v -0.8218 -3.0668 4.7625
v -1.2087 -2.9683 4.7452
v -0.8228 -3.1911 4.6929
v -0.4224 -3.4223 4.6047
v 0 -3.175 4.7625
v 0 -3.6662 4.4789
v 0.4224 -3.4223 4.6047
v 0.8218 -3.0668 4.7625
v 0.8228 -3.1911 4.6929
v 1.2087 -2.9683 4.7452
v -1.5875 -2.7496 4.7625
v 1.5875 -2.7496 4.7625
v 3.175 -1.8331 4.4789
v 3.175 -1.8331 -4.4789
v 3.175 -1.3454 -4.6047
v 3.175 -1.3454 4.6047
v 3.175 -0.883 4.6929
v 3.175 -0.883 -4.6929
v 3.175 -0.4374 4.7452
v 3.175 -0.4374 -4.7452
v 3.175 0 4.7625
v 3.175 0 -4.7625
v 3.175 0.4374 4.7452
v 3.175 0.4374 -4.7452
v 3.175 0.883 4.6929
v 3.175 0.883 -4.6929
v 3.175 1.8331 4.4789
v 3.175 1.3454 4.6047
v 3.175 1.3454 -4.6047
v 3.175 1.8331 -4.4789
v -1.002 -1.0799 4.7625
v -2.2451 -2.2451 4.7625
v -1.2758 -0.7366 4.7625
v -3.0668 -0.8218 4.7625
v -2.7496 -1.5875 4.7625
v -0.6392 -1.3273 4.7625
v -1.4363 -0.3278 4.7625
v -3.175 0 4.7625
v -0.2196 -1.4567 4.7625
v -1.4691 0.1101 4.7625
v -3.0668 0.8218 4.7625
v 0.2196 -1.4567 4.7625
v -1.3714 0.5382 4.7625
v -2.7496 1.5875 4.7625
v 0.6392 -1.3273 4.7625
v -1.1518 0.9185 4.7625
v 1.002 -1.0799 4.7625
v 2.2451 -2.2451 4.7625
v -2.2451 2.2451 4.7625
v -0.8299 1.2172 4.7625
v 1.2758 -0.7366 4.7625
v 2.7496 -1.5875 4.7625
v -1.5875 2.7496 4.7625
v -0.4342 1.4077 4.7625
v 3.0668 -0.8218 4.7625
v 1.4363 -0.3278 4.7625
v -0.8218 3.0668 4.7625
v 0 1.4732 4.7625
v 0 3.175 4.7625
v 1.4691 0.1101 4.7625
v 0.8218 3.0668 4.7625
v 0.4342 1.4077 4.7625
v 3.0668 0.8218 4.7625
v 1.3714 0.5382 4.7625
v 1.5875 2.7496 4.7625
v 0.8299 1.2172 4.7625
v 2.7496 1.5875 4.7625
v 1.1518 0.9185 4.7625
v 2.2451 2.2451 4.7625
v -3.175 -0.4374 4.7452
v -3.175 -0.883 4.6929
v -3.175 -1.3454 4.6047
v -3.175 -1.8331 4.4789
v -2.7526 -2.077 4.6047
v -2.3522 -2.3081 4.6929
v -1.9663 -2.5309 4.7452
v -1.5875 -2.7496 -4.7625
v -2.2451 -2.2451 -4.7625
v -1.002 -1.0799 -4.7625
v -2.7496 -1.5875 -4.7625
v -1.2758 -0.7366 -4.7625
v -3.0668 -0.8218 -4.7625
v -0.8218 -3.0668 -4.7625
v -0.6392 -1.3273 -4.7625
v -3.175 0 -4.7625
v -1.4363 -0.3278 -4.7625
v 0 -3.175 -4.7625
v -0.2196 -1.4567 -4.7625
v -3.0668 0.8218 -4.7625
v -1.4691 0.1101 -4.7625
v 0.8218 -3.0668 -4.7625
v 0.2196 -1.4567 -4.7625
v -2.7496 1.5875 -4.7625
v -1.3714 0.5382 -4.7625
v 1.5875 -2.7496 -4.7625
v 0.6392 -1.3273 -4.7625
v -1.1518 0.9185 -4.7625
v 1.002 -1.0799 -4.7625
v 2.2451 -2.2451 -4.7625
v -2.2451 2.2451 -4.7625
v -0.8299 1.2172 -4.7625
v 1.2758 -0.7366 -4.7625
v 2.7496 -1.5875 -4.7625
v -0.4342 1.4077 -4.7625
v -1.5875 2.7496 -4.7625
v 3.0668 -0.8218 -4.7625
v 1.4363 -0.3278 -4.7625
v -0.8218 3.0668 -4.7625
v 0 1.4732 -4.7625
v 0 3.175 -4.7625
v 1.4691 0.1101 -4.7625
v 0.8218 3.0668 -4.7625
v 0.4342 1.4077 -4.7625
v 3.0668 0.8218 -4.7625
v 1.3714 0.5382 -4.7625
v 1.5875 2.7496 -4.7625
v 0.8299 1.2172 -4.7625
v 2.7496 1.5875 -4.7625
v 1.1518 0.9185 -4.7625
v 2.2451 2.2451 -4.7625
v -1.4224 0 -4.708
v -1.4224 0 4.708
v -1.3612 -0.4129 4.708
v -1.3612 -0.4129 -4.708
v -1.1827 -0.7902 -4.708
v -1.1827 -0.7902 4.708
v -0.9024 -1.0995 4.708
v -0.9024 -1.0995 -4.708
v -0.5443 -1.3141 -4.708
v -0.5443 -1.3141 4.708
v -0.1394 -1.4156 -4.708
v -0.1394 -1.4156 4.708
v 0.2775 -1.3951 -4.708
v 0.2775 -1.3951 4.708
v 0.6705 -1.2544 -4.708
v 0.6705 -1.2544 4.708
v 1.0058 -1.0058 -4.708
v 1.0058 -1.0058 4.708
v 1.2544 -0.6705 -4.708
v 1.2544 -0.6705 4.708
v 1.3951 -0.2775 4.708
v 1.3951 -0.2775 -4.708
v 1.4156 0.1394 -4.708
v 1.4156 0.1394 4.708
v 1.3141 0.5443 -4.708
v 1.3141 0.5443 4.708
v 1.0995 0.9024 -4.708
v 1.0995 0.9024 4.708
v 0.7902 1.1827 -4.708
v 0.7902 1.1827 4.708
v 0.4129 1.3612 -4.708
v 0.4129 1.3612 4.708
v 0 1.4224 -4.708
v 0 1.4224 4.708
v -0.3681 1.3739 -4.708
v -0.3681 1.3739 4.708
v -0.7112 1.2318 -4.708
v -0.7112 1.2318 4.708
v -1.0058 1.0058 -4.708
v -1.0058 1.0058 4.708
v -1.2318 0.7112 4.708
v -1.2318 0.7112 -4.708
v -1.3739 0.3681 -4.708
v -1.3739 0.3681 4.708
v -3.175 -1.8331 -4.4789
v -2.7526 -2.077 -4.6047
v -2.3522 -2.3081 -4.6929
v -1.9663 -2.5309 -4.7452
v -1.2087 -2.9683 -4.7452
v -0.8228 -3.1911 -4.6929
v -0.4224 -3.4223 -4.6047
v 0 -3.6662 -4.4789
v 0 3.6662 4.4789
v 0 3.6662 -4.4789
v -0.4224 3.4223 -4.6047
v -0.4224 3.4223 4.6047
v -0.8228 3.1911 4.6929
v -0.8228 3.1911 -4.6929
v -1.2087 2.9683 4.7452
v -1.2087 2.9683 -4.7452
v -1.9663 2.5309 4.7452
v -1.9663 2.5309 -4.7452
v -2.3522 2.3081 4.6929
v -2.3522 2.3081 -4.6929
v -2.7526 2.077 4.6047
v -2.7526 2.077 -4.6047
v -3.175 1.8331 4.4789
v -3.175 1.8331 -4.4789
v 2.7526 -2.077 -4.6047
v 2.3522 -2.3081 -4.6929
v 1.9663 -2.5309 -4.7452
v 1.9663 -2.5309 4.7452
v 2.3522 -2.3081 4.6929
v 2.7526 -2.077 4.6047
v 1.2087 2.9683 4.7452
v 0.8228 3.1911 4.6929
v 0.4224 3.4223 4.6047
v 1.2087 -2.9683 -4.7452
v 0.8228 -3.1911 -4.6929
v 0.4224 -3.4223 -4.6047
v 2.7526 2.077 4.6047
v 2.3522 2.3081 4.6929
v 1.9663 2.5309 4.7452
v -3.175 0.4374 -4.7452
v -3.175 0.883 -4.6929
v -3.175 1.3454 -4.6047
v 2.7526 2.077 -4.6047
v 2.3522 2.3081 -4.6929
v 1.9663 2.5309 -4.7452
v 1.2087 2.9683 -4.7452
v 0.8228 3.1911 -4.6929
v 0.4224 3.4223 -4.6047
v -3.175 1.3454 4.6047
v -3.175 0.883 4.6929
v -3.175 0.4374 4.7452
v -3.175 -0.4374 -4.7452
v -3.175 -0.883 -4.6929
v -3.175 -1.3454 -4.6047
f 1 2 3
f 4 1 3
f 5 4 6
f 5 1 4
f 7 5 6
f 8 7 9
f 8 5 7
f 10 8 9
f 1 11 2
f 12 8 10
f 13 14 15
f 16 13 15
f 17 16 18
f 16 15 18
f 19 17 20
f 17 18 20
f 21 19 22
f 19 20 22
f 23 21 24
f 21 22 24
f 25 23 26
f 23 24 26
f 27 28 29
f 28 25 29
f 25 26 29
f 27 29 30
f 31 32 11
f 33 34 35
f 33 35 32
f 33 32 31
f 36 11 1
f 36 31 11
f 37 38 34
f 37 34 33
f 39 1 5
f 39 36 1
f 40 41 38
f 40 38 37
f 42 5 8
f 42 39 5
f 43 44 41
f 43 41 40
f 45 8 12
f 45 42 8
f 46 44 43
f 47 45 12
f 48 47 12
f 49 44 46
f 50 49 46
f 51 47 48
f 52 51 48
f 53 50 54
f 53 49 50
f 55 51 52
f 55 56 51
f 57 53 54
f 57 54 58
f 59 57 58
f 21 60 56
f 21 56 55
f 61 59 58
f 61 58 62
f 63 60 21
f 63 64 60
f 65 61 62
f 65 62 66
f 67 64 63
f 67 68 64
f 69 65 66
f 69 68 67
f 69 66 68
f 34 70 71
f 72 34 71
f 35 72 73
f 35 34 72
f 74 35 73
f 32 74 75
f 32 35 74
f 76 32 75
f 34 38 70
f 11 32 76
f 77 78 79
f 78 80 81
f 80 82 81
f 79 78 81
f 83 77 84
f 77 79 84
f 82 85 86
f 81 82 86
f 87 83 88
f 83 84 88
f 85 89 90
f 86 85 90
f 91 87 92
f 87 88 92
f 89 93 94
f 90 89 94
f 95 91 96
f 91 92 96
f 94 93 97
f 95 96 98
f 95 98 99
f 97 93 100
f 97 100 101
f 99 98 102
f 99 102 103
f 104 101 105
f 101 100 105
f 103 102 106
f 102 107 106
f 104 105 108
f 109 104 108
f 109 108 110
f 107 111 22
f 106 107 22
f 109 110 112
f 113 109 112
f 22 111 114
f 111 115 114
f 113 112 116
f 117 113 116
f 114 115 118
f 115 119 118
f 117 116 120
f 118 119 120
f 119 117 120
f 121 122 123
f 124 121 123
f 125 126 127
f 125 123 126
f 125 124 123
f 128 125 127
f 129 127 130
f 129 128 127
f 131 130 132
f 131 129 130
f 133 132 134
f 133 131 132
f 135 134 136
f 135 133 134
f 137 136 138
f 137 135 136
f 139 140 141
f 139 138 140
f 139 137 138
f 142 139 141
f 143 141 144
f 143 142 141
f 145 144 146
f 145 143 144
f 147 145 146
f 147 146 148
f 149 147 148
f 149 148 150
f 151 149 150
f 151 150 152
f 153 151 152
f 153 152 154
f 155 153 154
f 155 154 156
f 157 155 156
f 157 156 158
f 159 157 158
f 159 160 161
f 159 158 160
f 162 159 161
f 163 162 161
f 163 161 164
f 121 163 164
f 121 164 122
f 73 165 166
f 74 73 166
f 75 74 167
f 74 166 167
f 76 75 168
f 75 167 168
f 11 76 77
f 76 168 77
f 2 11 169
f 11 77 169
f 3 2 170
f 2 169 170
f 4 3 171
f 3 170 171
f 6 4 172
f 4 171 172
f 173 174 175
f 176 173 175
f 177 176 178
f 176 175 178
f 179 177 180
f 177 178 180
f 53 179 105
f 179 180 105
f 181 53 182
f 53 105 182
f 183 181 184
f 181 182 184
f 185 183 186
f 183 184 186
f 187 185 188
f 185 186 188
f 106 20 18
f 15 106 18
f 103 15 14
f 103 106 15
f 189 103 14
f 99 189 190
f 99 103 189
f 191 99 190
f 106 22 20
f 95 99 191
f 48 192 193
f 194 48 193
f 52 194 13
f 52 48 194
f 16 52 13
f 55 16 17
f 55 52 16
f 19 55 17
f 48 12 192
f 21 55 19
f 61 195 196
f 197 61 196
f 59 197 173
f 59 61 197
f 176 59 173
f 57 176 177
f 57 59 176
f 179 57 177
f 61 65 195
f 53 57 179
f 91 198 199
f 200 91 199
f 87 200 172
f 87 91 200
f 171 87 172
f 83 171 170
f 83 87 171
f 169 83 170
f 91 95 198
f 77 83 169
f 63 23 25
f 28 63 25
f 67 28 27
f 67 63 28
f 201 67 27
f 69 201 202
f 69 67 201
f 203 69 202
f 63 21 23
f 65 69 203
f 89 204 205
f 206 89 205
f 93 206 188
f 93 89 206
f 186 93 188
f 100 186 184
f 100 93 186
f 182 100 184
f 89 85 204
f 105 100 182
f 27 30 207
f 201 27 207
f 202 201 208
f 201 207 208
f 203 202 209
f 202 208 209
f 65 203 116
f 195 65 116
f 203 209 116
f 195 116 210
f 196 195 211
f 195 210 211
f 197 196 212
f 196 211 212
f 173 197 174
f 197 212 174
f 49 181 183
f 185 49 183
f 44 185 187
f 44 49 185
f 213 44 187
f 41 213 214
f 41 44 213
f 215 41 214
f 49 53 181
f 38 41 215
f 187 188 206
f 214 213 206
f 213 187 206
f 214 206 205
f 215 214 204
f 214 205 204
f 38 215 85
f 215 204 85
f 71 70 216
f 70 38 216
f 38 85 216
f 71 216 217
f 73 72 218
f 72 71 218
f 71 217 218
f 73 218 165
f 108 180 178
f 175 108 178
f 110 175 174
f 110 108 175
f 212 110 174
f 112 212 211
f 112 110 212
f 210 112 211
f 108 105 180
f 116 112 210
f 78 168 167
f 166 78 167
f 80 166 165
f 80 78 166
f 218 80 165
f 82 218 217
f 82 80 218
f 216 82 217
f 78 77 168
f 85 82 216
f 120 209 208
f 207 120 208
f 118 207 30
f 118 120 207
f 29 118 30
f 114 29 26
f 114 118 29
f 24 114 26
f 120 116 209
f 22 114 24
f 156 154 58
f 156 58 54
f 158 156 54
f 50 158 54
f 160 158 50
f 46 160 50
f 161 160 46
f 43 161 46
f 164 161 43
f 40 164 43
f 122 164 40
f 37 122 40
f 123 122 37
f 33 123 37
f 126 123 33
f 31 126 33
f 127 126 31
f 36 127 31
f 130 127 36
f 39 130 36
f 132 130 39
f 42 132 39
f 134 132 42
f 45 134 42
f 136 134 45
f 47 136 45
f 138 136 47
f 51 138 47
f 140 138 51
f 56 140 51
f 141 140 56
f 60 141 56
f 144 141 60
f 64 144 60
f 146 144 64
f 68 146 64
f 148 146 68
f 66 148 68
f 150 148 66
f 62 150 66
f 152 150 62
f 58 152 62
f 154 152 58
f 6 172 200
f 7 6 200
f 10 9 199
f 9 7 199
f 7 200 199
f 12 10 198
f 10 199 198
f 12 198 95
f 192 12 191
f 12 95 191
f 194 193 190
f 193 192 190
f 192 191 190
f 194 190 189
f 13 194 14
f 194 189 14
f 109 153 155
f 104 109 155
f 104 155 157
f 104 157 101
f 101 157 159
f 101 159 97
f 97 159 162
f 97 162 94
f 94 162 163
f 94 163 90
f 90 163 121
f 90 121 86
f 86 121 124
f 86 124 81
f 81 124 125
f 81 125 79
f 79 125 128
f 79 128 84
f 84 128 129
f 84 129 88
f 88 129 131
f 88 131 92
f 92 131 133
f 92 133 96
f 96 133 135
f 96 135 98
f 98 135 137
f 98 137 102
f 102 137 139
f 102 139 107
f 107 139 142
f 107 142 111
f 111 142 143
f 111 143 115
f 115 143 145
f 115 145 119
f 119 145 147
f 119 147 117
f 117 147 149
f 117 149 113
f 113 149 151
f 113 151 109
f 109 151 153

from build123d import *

# Parameters (mm, degrees)
EXTRUDE1_DEPTH          = 4.7625
EXTRUDE1_DEPTH_BACK     = 4.7625
SKETCH1_R               = 1.4224
SKETCH8_OUTSIDE_W       = 51.56
SKETCH8_OUTSIDE_H       = 52.542
SKETCH8_OUTSIDE_R       = 3.175
EXTRUDE4_DEPTH          = 11.688642726
EXTRUDE4_DRAFT          = -60
MIRROR1_COPY_1_SKETCH_W = 51.56
MIRROR1_COPY_1_SKETCH_H = 52.542
MIRROR1_COPY_1_SKETCH_R = 3.175
MIRROR1_COPY_1_DEPTH    = 11.688642726
MIRROR1_COPY_1_DRAFT    = -60


with BuildPart() as part:
    # Sketch1 → Extrude1 (new, two sides: drawn at the far end of the back side and taken through both)
    with BuildSketch(Plane.XY.offset(-EXTRUDE1_DEPTH_BACK)):
        Polygon((0, 3.666174209), (-3.175, 1.833087105), (-3.175, -1.833087105), (0, -3.666174209), (3.175, -1.833087105), (3.175, 1.833087105), align=None)
        with Locations(Location((0, 0, 0), (0, 0, 180))):
            Circle(SKETCH1_R, mode=Mode.SUBTRACT)
    extrude(amount=EXTRUDE1_DEPTH + EXTRUDE1_DEPTH_BACK)

    # Extrude3 cone 1 section (through the dimple's axis) → Extrude3 (revolve, cut)
    with BuildSketch(Plane(origin=(0, 0, -4.7625), x_dir=(0, 1, 0), z_dir=(1, 0, 0))):
        Polygon((0, 0), (1.4732, 0), (0, 1.579813584), align=None)
    extrude3 = revolve(axis=Axis((0, 0, -4.7625), (0, 0, 1)), mode=Mode.SUBTRACT)


with BuildPart() as extrude4_tool:
    # Sketch8 outside → Extrude4 (with draft: the straight prism first)
    with BuildSketch(Plane(origin=(0, 0, -4.7625), x_dir=(-1, 0, 0), z_dir=(0, 0, -1))):
        Rectangle(SKETCH8_OUTSIDE_W, SKETCH8_OUTSIDE_H)
        Circle(SKETCH8_OUTSIDE_R, mode=Mode.SUBTRACT)
    extrude(amount=-EXTRUDE4_DEPTH)
    # Extrude4: the draft: its side faces are tilted about the plane it starts from
    extrude4_sides = [extrude4_tool.faces().sort_by_distance(p)[0] for p in [
        (0, -26.271, 1.081821363),
        (-25.78, 0, 1.081821363),
        (0, 26.271, 1.081821363),
        (25.78, 0, 1.081821363),
        (3.175, 0, 1.081821363),
    ]]
    draft(extrude4_sides, Plane(origin=(0, 0, -4.7625), x_dir=(-1, 0, 0), z_dir=(0, 0, -1)), EXTRUDE4_DRAFT)


with BuildPart() as part_1:
    add(part.part)

    # Extrude4: cut by extrude4_tool
    add(extrude4_tool.part, mode=Mode.SUBTRACT)

    # Mirror1: Extrude3 across plane
    add(extrude3.mirror(Plane.XY), mode=Mode.SUBTRACT)


with BuildPart() as mirror1_copy_1_tool:
    # Mirror1 copy 1 sketch → Mirror1 copy 1 (with draft: the straight prism first)
    with BuildSketch(Plane(origin=(0, 0, 4.7625), x_dir=(-1, 0, 0), z_dir=(0, 0, 1))):
        Rectangle(MIRROR1_COPY_1_SKETCH_W, MIRROR1_COPY_1_SKETCH_H)
        Circle(MIRROR1_COPY_1_SKETCH_R, mode=Mode.SUBTRACT)
    extrude(amount=-MIRROR1_COPY_1_DEPTH)
    # Mirror1 copy 1: the draft: its side faces are tilted about the plane it starts from
    mirror1_copy_1_sides = [mirror1_copy_1_tool.faces().sort_by_distance(p)[0] for p in [
        (0, -26.271, -1.081821363),
        (-25.78, 0, -1.081821363),
        (0, 26.271, -1.081821363),
        (25.78, 0, -1.081821363),
        (3.175, 0, -1.081821363),
    ]]
    draft(mirror1_copy_1_sides, Plane(origin=(0, 0, 4.7625), x_dir=(-1, 0, 0), z_dir=(0, 0, 1)), MIRROR1_COPY_1_DRAFT)


with BuildPart() as part_2:
    add(part_1.part)

    # Mirror1 copy 1: cut by mirror1_copy_1_tool
    add(mirror1_copy_1_tool.part, mode=Mode.SUBTRACT)


solid = part_2.part
